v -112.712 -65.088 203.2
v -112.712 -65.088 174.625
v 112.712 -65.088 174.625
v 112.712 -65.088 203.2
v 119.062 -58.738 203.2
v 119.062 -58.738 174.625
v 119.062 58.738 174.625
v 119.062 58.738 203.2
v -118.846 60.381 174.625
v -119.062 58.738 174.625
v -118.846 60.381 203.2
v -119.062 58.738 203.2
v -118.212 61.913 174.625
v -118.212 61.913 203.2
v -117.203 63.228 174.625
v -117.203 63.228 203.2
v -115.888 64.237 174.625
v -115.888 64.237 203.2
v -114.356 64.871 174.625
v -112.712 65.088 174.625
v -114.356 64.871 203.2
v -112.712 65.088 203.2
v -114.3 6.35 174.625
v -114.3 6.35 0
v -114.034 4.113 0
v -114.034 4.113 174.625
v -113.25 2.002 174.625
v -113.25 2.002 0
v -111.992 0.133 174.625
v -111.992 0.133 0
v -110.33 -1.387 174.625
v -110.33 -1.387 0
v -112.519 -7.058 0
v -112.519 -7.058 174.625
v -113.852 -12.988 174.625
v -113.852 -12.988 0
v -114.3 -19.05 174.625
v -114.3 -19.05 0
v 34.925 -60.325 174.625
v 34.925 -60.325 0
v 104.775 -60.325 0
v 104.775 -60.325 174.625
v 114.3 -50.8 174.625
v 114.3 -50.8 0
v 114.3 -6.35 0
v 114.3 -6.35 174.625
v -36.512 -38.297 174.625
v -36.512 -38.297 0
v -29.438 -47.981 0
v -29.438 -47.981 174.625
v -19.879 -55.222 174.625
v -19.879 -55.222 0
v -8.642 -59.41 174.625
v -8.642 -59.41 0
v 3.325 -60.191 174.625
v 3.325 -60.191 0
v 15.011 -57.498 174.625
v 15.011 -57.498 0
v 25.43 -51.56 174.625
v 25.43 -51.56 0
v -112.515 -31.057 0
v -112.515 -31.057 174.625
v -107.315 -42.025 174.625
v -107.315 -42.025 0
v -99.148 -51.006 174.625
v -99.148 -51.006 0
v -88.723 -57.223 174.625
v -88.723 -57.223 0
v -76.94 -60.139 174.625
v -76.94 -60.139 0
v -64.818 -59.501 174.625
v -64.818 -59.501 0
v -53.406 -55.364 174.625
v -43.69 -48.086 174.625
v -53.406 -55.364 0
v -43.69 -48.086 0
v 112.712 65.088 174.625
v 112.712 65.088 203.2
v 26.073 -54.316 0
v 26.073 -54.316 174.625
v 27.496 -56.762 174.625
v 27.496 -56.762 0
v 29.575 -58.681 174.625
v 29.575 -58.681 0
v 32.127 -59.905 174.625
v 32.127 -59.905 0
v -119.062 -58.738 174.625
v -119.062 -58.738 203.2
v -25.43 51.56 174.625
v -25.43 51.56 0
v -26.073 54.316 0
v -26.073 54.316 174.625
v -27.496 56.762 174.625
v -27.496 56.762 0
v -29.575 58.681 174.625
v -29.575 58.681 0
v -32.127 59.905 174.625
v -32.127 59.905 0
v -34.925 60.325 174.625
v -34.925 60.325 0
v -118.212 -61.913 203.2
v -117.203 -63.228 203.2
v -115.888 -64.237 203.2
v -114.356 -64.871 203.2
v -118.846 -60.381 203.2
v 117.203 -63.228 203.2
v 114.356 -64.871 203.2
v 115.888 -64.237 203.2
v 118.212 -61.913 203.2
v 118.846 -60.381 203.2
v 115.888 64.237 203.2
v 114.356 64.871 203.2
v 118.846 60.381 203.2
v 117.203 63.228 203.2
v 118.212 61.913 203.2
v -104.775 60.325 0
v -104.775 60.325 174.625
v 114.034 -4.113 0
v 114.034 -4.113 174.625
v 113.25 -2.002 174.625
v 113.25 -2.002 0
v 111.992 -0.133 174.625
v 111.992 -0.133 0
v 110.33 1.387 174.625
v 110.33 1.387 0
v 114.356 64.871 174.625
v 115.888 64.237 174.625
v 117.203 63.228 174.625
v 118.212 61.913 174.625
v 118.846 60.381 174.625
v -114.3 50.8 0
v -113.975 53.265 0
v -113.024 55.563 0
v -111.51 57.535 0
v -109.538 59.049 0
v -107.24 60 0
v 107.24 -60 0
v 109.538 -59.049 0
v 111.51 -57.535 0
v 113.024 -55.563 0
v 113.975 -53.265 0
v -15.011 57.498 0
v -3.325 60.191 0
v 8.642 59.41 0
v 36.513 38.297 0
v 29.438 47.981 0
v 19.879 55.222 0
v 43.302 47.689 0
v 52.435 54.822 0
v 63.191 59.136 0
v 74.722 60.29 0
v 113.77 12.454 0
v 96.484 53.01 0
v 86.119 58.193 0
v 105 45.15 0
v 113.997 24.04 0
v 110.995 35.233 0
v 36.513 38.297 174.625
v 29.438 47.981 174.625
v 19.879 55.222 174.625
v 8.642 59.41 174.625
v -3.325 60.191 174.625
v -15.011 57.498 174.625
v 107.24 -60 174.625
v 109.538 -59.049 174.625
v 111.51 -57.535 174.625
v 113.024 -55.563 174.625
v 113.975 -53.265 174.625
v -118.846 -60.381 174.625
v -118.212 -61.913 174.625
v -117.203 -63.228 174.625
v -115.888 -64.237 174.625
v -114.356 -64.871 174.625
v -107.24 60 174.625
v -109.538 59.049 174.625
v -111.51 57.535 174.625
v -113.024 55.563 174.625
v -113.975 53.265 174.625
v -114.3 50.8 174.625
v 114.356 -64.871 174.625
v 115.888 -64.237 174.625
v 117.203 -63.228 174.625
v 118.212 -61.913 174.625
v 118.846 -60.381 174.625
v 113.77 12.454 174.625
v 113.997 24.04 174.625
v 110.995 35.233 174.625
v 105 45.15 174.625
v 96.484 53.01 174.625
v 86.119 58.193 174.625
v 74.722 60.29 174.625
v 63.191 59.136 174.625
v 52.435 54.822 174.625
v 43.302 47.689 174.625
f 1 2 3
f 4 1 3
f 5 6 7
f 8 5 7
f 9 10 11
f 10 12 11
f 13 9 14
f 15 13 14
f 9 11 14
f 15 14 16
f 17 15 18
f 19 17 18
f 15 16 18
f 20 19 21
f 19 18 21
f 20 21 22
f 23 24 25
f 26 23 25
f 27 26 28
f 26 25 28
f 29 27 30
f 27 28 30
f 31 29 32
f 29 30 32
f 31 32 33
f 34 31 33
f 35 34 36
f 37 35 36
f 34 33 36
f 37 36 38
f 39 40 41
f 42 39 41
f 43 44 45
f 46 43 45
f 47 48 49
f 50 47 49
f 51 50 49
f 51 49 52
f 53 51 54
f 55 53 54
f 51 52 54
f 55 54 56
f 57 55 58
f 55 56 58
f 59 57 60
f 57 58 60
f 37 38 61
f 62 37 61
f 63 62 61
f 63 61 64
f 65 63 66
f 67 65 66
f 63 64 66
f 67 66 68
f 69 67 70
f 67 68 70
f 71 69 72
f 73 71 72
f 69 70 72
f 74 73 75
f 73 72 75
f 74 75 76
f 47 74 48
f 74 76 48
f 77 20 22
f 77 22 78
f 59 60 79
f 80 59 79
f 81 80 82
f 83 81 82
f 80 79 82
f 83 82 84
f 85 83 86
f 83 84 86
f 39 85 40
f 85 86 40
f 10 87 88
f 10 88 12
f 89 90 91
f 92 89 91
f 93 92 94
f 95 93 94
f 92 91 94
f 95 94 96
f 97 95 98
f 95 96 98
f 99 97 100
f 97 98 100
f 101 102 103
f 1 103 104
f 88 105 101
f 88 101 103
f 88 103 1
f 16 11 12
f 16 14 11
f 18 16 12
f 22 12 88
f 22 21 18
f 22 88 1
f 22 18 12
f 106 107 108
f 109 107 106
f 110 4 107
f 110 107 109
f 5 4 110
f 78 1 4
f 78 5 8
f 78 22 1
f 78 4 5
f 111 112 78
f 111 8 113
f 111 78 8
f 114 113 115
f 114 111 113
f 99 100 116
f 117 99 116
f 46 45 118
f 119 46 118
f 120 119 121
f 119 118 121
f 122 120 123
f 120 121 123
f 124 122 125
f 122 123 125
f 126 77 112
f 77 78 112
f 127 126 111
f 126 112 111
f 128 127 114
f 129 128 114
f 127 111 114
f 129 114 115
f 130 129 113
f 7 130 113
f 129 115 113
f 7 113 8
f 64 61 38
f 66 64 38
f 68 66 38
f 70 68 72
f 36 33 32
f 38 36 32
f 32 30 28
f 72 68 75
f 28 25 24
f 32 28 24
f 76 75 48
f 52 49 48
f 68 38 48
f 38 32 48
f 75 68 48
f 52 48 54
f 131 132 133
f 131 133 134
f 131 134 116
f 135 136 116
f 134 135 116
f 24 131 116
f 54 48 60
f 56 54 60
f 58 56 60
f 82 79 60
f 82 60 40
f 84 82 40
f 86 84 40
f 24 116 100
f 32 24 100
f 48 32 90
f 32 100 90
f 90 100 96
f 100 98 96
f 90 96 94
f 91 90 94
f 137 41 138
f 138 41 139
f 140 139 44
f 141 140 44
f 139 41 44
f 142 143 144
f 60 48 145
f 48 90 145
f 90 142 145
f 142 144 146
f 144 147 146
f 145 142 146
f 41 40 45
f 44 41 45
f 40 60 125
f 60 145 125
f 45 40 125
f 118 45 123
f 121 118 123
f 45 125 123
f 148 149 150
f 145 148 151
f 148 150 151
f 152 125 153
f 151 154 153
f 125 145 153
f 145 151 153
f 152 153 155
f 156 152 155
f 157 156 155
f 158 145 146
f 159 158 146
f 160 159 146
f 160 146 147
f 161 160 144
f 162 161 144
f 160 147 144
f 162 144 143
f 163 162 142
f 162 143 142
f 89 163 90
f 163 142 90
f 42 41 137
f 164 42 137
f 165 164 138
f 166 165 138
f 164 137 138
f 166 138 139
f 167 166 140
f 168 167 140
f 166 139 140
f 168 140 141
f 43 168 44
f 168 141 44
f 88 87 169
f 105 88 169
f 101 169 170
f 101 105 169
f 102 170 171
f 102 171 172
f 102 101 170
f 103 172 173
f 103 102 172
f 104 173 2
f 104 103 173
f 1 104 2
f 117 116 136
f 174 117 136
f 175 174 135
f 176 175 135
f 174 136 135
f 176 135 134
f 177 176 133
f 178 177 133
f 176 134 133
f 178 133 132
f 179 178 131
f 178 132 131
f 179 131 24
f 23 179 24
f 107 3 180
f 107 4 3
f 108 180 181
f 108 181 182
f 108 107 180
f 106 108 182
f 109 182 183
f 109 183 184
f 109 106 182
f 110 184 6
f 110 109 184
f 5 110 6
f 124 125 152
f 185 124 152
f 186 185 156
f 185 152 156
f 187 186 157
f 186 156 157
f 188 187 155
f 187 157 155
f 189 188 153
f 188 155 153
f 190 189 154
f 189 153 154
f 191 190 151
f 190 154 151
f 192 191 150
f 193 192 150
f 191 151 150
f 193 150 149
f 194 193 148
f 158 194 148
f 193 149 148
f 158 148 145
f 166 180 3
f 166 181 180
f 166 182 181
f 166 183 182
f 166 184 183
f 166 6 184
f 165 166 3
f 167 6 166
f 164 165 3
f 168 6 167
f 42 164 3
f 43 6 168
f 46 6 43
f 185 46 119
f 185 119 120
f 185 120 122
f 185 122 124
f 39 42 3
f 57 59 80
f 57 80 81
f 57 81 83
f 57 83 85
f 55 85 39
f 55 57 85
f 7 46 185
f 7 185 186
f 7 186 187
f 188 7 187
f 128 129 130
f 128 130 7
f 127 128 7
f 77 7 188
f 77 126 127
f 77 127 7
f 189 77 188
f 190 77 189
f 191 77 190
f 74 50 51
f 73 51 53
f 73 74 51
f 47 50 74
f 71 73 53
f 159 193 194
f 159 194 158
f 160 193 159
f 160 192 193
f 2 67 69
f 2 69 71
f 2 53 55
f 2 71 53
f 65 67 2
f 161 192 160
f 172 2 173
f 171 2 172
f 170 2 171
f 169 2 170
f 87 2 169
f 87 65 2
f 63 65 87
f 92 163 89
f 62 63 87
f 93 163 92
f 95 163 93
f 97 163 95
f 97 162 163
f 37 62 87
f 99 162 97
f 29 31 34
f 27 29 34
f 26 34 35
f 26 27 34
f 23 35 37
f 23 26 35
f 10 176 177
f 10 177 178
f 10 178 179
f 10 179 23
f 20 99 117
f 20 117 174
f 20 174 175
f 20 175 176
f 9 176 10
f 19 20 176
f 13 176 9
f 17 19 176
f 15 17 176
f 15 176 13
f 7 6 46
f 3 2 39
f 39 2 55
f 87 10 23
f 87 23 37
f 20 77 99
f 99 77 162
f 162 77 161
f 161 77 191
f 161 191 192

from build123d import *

# Parameters (mm, degrees)
SKETCH1_W           = 238.125
SKETCH1_H           = 130.175
BOSS_EXTRUDE1_DEPTH = 203.2
SKETCH2_W           = 238.125
SKETCH2_H           = 130.175
CUT_EXTRUDE1_DEPTH  = 174.625
FILLET1_R           = 6.35


with BuildPart() as part:
    # Sketch1 → Boss-Extrude1 (new body)
    with BuildSketch(Plane.XY):
        Rectangle(SKETCH1_W, SKETCH1_H)
    extrude(amount=BOSS_EXTRUDE1_DEPTH)

    # Sketch2 → Cut-Extrude1 (cut)
    with BuildSketch(Plane(origin=(0, 0, 0), x_dir=(-1, 0, 0), z_dir=(0, 0, -1))):
        Rectangle(SKETCH2_W, SKETCH2_H)
        with BuildLine():
            ThreePointArc((114.3, -19.05), (82.938934322, -59.116688549), (36.5125, -38.297414599))
            ThreePointArc((36.5125, -38.297414599), (8.641725006, -59.410205821), (-25.430393972, -51.56031663))
            ThreePointArc((-25.430393972, -51.56031663), (-28.464210223, -57.798844223), (-34.925, -60.325))
            Line((-34.925, -60.325), (-104.775, -60.325))
            ThreePointArc((-104.775, -60.325), (-111.510192091, -57.535192091), (-114.3, -50.8))
            Line((-114.3, -50.8), (-114.3, -6.35))
            ThreePointArc((-114.3, -6.35), (-113.249567583, -2.001744111), (-110.329957107, 1.387446384))
            ThreePointArc((-110.329957107, 1.387446384), (-91.484237132, 55.967234316), (-36.5125, 38.297414599))
            ThreePointArc((-36.5125, 38.297414599), (-8.641725006, 59.410205821), (25.430393972, 51.56031663))
            ThreePointArc((25.430393972, 51.56031663), (28.464210223, 57.798844223), (34.925, 60.325))
            Line((34.925, 60.325), (104.775, 60.325))
            ThreePointArc((104.775, 60.325), (111.510192091, 57.535192091), (114.3, 50.8))
            Line((114.3, 50.8), (114.3, 6.35))
            ThreePointArc((114.3, 6.35), (113.249567583, 2.001744111), (110.329957107, -1.387446384))
            ThreePointArc((110.329957107, -1.387446384), (113.295260302, -9.998383558), (114.3, -19.05))
        make_face(mode=Mode.SUBTRACT)
    extrude(amount=-CUT_EXTRUDE1_DEPTH, mode=Mode.SUBTRACT)

    # Fillet1
    fillet1_edges = [part.edges().sort_by_distance(p)[0] for p in [
        (119.0625, -65.0875, 188.9125),
        (-119.0625, -65.0875, 188.9125),
        (-119.0625, 65.0875, 188.9125),
        (119.0625, 65.0875, 188.9125),
    ]]
    fillet(fillet1_edges, radius=FILLET1_R)


solid = part.part
